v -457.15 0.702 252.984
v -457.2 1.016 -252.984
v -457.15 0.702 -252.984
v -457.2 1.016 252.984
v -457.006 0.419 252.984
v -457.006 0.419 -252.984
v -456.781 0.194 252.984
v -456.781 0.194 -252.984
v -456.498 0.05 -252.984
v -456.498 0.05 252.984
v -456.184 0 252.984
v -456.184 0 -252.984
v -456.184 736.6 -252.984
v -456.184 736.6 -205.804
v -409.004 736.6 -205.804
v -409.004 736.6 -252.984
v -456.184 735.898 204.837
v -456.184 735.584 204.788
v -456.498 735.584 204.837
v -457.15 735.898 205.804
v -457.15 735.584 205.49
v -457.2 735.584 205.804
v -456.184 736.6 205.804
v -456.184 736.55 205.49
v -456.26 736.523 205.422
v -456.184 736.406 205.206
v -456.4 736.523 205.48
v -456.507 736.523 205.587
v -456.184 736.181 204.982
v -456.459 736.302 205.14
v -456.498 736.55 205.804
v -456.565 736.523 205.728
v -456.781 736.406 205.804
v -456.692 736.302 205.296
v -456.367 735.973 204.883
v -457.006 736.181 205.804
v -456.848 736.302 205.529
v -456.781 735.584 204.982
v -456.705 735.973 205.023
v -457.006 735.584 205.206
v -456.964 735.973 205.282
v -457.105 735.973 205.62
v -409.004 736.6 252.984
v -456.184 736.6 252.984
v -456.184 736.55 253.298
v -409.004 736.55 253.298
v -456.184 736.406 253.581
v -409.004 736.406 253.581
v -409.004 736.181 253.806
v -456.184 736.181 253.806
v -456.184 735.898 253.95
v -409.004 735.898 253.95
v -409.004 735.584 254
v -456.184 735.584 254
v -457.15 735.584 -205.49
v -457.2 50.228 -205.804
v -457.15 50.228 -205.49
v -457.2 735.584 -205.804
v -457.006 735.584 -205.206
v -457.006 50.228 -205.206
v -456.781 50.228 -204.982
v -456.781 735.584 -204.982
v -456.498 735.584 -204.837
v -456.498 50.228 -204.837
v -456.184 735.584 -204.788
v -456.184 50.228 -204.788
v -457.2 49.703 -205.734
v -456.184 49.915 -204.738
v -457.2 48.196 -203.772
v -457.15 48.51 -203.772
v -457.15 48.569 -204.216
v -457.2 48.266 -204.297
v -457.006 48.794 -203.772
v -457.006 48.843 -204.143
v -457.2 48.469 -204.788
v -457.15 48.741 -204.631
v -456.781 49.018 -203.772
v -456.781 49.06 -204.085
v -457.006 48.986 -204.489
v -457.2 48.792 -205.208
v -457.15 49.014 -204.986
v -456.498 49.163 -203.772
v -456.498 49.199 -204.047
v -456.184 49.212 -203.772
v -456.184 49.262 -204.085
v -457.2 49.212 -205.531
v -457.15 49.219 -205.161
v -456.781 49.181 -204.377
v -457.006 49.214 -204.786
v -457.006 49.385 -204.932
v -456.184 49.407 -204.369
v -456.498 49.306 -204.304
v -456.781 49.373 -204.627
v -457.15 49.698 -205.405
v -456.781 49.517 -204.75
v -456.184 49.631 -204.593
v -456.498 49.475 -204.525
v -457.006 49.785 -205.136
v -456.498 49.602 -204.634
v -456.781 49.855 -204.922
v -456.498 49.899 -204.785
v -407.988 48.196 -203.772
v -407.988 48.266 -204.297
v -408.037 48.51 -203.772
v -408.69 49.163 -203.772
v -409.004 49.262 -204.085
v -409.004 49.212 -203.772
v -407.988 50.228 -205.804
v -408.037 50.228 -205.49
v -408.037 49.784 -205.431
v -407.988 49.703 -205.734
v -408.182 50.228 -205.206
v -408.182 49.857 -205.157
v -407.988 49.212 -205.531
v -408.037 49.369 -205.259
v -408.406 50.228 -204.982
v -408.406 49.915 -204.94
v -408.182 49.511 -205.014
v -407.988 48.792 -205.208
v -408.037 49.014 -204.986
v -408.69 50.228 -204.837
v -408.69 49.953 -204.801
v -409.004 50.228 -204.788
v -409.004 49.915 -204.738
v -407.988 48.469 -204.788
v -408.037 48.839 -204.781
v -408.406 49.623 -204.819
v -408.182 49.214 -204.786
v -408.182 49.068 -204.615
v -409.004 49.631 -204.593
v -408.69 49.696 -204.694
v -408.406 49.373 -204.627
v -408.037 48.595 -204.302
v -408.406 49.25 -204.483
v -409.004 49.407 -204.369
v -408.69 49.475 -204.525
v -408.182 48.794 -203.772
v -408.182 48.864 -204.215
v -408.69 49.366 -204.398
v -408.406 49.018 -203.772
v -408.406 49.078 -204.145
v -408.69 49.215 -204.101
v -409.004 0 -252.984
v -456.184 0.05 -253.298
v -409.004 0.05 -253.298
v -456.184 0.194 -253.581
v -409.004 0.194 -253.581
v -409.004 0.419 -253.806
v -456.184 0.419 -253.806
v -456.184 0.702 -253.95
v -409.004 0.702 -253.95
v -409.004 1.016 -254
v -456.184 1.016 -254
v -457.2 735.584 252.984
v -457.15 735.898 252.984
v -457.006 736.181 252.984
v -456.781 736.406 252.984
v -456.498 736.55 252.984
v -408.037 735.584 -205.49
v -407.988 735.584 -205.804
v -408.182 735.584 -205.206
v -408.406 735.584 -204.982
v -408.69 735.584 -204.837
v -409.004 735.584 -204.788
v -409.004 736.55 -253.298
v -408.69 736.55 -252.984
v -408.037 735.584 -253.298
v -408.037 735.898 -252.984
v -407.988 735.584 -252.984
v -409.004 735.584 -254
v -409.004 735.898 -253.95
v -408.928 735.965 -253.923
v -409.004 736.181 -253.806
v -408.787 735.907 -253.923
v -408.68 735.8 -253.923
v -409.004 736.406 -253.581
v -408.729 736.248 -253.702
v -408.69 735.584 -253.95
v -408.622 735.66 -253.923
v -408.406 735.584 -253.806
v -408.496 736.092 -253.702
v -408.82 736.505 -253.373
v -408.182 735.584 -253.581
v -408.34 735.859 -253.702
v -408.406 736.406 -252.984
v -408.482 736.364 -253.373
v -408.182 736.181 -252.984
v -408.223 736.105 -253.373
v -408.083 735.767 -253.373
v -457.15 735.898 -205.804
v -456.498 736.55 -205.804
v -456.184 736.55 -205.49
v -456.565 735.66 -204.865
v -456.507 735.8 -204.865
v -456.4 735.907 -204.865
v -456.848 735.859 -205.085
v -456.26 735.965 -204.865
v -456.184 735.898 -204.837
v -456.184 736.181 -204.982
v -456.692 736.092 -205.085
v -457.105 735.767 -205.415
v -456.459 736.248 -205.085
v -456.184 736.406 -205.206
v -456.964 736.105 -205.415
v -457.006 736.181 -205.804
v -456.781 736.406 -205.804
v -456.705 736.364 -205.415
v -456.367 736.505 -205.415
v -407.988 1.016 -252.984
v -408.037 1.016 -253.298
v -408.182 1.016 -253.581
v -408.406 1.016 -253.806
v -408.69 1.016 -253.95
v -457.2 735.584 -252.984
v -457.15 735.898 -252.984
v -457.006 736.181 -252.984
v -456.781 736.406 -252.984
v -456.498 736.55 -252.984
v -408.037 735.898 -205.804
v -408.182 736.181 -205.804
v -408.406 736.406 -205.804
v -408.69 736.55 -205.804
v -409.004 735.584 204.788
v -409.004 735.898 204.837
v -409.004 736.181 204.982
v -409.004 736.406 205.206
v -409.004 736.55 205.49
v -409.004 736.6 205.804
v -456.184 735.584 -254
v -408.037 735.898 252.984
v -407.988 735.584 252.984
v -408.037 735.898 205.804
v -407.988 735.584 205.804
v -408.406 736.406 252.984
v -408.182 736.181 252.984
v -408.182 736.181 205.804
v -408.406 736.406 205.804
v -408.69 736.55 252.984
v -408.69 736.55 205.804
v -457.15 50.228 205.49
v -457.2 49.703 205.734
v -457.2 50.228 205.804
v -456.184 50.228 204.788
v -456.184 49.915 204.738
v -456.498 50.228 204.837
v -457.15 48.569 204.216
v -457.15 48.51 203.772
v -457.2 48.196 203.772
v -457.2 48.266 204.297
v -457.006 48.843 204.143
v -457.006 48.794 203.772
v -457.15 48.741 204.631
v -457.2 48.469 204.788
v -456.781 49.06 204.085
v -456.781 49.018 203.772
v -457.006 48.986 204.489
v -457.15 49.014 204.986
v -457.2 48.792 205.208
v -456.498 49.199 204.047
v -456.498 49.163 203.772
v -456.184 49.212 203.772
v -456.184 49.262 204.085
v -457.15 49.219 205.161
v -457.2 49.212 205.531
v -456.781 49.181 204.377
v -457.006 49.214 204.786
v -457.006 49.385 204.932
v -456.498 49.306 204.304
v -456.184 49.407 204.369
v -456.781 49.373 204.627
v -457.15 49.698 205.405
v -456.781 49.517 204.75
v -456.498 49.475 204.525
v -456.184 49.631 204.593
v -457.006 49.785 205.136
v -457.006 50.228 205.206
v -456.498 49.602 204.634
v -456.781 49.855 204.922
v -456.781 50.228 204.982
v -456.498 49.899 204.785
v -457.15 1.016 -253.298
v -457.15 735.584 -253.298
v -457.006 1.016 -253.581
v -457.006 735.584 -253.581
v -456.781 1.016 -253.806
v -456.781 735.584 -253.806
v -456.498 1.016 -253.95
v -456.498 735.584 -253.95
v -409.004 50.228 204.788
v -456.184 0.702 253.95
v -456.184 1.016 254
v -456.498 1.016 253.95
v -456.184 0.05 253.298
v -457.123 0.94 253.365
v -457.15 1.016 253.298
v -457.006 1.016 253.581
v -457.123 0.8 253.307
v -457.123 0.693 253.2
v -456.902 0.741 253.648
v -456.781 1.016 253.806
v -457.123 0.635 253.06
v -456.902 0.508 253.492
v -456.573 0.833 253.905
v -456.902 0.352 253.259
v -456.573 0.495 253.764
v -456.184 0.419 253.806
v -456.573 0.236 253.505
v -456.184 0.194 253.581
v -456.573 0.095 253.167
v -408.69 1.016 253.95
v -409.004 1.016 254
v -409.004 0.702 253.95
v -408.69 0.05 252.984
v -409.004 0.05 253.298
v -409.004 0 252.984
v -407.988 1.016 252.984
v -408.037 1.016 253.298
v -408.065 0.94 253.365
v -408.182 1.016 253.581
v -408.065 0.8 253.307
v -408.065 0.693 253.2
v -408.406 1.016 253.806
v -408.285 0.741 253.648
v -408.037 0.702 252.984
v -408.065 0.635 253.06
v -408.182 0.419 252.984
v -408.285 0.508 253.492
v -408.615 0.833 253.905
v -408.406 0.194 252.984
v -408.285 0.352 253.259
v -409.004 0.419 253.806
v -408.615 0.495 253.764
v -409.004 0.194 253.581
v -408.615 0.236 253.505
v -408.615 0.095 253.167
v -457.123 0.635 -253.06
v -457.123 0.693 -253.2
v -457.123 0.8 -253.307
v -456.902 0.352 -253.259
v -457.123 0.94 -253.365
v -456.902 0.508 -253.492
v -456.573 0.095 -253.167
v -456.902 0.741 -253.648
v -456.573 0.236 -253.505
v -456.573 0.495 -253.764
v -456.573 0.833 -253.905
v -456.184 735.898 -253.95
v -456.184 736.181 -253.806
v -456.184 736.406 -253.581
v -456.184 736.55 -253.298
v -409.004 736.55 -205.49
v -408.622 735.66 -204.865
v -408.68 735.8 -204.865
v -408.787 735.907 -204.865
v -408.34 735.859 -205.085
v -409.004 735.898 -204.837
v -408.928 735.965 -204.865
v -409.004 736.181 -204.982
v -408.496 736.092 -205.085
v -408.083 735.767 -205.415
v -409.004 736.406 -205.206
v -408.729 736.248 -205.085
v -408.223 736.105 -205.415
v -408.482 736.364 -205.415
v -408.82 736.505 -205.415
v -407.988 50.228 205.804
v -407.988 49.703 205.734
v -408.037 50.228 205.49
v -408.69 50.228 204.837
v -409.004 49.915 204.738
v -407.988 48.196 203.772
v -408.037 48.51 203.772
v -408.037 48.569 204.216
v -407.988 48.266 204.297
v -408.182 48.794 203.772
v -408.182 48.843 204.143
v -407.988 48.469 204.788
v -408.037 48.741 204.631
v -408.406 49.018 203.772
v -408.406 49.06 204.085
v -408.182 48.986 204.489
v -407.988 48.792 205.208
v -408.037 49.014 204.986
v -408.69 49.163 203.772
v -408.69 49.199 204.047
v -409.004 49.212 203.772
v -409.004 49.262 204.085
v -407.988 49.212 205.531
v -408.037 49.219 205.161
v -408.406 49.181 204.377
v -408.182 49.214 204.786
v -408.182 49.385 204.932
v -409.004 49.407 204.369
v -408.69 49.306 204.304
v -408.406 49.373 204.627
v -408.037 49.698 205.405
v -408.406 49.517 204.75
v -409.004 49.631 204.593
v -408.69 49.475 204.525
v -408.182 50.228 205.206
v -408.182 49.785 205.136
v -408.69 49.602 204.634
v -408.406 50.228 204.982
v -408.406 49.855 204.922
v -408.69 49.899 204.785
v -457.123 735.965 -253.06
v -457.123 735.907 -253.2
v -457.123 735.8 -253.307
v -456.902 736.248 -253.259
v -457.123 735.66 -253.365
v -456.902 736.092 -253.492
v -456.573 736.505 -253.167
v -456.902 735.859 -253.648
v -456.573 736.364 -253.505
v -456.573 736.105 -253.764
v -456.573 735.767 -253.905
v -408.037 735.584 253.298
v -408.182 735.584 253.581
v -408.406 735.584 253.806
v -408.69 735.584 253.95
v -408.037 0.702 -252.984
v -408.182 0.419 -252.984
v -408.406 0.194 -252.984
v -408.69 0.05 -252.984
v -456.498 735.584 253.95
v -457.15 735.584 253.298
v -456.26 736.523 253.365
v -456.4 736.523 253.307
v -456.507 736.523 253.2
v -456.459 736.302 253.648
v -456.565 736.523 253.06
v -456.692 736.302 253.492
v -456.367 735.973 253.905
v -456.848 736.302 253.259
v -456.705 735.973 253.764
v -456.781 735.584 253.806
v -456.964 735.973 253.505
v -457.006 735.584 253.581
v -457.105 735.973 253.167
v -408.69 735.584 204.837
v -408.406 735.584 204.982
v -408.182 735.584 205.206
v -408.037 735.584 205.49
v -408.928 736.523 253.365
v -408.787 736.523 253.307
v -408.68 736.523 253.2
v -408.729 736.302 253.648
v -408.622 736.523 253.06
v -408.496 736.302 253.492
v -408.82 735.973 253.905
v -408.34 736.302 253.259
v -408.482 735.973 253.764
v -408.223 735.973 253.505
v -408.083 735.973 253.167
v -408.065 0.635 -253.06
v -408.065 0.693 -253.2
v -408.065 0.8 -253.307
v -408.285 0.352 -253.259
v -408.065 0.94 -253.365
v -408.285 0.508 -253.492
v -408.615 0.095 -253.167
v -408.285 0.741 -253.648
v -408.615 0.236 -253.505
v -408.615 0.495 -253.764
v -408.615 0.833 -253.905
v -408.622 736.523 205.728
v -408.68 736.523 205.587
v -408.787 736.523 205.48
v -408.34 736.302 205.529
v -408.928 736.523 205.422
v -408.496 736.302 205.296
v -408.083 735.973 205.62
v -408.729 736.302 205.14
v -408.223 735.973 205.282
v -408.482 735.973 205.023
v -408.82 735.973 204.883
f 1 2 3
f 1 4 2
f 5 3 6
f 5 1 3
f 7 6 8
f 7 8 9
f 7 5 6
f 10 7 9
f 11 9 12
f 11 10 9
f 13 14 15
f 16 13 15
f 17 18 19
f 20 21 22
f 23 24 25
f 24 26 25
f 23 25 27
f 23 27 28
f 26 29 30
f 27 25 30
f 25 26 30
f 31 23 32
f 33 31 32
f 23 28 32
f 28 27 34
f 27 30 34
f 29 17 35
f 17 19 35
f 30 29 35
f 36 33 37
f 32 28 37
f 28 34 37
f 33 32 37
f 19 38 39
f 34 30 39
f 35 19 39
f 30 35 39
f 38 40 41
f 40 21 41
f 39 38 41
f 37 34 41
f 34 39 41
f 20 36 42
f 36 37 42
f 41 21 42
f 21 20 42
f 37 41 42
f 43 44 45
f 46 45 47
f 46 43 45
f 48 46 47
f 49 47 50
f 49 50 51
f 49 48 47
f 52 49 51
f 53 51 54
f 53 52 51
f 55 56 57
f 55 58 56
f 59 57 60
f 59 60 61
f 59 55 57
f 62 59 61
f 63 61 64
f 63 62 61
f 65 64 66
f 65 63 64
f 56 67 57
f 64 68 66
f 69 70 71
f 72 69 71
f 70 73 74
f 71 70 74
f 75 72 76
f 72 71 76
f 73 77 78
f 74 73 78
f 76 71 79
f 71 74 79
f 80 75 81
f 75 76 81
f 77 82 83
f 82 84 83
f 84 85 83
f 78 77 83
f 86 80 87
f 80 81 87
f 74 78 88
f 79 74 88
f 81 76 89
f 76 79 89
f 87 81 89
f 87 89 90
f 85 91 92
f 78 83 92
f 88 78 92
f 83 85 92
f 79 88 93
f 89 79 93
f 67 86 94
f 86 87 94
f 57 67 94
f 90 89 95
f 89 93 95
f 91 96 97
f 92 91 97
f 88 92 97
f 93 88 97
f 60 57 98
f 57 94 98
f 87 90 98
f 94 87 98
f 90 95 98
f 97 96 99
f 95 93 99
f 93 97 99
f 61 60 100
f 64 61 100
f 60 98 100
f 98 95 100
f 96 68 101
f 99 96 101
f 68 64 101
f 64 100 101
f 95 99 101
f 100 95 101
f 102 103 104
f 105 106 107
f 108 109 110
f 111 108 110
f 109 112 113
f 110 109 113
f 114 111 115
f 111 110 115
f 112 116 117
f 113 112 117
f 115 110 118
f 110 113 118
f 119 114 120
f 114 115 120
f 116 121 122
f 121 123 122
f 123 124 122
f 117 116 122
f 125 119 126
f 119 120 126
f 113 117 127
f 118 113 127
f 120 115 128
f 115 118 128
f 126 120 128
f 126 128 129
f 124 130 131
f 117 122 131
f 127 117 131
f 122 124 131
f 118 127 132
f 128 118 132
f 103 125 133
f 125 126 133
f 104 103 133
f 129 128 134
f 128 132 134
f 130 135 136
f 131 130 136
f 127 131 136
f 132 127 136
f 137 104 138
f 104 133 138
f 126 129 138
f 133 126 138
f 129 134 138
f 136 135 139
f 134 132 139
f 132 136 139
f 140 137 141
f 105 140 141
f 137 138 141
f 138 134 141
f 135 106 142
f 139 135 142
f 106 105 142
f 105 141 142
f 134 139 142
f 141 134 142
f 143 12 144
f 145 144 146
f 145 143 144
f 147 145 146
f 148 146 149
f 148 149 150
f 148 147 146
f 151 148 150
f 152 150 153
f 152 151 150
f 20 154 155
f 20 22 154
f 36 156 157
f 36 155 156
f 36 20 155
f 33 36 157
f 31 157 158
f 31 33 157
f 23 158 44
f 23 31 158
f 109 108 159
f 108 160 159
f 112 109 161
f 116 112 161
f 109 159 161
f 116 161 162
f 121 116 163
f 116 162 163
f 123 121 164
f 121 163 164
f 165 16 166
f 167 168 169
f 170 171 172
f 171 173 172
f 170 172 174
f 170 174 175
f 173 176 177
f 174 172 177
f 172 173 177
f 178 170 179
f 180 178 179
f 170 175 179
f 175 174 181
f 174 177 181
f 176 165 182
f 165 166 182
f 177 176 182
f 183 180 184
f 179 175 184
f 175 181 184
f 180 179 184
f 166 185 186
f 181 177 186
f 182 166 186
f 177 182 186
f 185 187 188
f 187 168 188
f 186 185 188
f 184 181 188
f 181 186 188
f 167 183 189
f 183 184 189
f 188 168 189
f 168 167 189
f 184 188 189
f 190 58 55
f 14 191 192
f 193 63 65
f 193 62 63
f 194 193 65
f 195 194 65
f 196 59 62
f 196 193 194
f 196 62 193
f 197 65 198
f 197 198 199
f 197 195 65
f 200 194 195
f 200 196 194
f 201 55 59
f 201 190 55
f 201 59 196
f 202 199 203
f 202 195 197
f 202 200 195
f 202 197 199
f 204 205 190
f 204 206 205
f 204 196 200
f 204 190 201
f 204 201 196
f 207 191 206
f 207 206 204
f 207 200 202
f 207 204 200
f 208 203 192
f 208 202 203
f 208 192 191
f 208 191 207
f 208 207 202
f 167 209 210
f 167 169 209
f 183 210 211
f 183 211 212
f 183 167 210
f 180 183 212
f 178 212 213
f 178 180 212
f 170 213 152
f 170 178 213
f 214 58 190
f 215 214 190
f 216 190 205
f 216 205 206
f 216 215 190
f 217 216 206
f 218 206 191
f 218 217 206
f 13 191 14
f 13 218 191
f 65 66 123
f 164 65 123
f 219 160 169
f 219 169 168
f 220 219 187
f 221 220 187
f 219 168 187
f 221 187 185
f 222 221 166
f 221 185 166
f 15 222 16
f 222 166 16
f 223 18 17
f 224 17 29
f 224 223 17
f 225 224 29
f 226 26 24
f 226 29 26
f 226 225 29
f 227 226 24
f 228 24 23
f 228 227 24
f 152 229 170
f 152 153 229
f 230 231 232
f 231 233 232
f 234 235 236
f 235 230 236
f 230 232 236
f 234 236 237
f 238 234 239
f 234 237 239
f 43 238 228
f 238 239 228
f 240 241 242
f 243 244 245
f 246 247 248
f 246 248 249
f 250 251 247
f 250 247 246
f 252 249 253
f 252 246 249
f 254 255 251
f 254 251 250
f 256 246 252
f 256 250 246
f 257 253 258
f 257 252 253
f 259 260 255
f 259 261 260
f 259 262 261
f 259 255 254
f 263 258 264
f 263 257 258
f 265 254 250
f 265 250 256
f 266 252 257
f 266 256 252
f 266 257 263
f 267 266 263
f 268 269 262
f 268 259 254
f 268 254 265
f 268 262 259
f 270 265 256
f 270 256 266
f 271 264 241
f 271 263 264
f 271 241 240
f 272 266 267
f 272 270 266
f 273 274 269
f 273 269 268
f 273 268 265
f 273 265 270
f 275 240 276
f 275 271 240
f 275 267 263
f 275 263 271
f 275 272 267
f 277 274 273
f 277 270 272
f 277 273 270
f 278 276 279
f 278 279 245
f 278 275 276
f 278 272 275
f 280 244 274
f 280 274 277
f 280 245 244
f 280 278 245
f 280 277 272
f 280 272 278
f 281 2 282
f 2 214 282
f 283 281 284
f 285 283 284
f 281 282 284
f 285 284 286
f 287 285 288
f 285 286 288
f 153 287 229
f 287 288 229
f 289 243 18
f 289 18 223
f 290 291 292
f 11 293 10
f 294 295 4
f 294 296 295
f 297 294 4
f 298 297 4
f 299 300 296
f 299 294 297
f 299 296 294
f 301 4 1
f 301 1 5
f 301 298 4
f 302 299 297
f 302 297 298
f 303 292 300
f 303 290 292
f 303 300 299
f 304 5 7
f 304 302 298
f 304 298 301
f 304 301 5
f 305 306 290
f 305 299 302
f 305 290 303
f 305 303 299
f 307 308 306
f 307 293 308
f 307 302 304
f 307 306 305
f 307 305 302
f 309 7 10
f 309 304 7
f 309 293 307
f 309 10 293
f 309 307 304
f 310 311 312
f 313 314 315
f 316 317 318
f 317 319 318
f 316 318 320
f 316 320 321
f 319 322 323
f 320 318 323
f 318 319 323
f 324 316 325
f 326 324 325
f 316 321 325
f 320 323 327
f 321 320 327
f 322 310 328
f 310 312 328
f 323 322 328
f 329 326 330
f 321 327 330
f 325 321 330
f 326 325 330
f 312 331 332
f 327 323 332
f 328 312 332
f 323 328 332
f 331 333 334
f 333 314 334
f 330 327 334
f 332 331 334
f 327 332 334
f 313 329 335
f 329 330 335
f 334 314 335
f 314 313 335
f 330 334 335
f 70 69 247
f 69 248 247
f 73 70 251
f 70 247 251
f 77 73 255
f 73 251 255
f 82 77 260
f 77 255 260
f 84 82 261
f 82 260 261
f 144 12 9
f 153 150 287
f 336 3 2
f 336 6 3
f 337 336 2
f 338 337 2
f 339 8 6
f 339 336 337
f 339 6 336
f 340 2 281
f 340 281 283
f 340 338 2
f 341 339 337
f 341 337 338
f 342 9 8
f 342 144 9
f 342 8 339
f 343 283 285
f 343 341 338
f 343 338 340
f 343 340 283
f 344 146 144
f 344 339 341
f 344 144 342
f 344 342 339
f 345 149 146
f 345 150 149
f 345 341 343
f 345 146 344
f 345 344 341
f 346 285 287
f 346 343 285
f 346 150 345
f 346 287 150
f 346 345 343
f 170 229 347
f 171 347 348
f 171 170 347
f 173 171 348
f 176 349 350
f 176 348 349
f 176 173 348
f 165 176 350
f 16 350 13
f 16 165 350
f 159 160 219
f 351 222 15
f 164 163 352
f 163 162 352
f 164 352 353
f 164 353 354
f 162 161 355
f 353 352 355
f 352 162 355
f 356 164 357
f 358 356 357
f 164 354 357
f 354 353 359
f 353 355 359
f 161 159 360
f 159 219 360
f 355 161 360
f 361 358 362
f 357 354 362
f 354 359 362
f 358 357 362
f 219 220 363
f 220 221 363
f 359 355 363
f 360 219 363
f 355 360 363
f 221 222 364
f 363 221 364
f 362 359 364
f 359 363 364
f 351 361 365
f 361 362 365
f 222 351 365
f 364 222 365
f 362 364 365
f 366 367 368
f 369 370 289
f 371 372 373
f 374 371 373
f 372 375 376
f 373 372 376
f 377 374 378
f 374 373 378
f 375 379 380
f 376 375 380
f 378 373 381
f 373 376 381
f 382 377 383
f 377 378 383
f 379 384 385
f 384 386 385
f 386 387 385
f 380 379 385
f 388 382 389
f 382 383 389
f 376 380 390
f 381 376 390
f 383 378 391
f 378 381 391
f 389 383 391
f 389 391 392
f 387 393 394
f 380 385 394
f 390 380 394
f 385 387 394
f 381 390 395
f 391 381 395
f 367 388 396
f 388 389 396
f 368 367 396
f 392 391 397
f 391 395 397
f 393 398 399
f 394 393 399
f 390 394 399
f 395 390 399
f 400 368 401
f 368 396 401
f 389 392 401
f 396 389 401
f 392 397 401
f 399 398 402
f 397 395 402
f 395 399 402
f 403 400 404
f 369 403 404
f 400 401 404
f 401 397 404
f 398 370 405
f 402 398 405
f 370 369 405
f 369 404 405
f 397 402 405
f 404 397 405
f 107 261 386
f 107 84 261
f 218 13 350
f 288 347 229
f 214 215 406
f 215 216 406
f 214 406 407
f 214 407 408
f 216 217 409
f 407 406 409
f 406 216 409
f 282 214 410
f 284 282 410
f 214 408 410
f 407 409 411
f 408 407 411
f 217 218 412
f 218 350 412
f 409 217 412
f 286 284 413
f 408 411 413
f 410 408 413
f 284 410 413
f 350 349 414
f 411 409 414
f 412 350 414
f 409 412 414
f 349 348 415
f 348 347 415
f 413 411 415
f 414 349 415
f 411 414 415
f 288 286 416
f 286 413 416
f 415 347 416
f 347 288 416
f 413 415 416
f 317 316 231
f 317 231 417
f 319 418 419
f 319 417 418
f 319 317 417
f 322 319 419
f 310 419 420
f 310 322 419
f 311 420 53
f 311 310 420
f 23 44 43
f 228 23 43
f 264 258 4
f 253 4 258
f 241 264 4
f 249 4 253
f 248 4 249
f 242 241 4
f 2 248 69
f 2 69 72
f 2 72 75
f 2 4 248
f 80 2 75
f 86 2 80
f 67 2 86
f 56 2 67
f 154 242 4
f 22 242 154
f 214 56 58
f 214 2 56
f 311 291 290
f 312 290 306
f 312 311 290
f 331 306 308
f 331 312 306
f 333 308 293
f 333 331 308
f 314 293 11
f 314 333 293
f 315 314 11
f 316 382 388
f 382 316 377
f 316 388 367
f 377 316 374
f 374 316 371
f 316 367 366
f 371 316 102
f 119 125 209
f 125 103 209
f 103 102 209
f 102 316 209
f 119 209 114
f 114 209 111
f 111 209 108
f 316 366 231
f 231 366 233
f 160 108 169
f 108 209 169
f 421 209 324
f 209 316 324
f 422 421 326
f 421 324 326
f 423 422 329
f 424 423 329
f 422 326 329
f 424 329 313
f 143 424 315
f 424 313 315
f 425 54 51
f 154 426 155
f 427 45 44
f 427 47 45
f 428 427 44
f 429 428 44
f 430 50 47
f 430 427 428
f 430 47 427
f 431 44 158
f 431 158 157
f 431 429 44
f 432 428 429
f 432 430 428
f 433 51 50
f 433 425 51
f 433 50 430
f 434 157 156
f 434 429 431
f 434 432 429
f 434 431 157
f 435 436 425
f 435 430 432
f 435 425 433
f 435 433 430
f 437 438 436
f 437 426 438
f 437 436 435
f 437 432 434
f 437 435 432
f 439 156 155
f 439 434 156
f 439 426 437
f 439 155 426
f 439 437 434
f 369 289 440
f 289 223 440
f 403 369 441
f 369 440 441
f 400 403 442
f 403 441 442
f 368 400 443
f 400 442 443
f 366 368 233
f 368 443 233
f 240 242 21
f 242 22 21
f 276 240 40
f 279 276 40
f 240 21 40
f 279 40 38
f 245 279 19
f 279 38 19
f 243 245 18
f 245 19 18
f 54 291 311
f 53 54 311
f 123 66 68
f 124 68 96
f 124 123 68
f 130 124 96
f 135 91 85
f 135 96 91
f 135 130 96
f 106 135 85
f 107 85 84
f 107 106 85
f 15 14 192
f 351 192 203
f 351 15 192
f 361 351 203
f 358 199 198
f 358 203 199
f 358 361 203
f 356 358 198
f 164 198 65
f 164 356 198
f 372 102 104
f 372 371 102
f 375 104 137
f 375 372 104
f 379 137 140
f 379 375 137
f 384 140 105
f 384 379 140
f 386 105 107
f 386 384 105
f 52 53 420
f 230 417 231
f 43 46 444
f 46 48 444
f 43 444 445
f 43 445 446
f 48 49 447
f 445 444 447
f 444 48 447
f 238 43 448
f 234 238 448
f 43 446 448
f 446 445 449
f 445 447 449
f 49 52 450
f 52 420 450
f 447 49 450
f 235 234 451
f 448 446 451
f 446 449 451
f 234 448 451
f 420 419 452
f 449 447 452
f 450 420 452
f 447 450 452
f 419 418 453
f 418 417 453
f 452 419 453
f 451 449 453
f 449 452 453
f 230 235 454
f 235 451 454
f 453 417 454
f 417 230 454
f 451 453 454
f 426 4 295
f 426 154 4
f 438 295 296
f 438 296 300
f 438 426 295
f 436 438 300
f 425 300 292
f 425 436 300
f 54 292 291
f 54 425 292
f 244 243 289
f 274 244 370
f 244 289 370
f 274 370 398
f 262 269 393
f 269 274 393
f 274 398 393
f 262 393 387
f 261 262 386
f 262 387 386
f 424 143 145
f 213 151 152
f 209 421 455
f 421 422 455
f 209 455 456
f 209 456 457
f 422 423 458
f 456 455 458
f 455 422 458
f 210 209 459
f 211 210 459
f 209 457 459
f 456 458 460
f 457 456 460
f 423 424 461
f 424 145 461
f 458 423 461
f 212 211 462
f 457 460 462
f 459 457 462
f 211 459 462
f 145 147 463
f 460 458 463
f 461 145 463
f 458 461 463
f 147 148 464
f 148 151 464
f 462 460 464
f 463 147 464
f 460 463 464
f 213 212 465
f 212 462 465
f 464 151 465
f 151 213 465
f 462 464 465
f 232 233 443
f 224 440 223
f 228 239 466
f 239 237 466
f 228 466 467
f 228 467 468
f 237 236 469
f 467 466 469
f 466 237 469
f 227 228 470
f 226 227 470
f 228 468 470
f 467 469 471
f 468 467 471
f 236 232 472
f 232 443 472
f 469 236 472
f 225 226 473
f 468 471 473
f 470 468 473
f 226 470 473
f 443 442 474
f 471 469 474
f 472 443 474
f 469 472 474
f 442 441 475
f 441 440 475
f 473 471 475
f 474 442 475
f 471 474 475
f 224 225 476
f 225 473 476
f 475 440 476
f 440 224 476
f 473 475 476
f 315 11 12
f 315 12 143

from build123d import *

# Parameters (mm, degrees)
SKETCH1_W             = 49.2125
SKETCH1_H             = 49.2125
BOSS_EXTRUDE1_DEPTH   = 736.6
BOSS_EXTRUDE1_2_DEPTH = 736.6
SKETCH2_W             = 49.2125
SKETCH2_H             = 49.2125
BOSS_EXTRUDE2_DEPTH   = 458.7875
FILLET1_R             = 1.016


with BuildPart() as part:
    # Sketch1 → Boss-Extrude1 (new body)
    with BuildSketch(Plane(origin=(0, 0, 0), x_dir=(1, 0, 0), z_dir=(0, 1, 0))):
        with Locations((-432.59375, 229.39375)):
            Rectangle(SKETCH1_W, SKETCH1_H)
    extrude(amount=BOSS_EXTRUDE1_DEPTH)



with BuildPart() as body_2:
    # Sketch1 → Boss-Extrude1 2 (new body)
    with BuildSketch(Plane(origin=(0, 0, 0), x_dir=(1, 0, 0), z_dir=(0, 1, 0))):
        with Locations((-432.59375, -229.39375)):
            Rectangle(SKETCH1_W, SKETCH1_H)
    extrude(amount=BOSS_EXTRUDE1_2_DEPTH)


with BuildPart() as part_1:
    add(part.part)

    add(body_2.part)  # Boss-Extrude2 merges body 2
    # Sketch2 → Boss-Extrude2 (add)
    with BuildSketch(Plane.XY.offset(-204.7875)):
        with Locations((-432.59375, 24.60625)):
            Rectangle(SKETCH2_W, SKETCH2_H)
    extrude(amount=BOSS_EXTRUDE2_DEPTH)

    # Fillet1
    fillet1_edges = [part_1.edges().sort_by_distance(p)[0] for p in [
        (-407.9875, 736.6, -229.39375),
        (-432.59375, 49.2125, 204.7875),
        (-407.9875, 49.2125, 0),
        (-432.59375, 49.2125, -204.7875),
        (-457.2, 49.2125, 0),
        (-432.59375, 736.6, -254),
        (-407.9875, 392.90625, 204.7875),
        (-432.59375, 0, 254),
        (-457.2, 368.3, 254),
        (-407.9875, 368.3, 254),
        (-457.2, 392.90625, 204.7875),
        (-432.59375, 736.6, 254),
        (-407.9875, 736.6, 229.39375),
        (-432.59375, 736.6, 204.7875),
        (-457.2, 736.6, 229.39375),
        (-457.2, 736.6, -229.39375),
        (-432.59375, 0, -254),
        (-407.9875, 0, 0),
        (-457.2, 0, 0),
        (-457.2, 368.3, -254),
        (-407.9875, 368.3, -254),
        (-407.9875, 392.90625, -204.7875),
        (-457.2, 392.90625, -204.7875),
        (-432.59375, 736.6, -204.7875),
    ]]
    fillet(fillet1_edges, radius=FILLET1_R)


solid = part_1.part
